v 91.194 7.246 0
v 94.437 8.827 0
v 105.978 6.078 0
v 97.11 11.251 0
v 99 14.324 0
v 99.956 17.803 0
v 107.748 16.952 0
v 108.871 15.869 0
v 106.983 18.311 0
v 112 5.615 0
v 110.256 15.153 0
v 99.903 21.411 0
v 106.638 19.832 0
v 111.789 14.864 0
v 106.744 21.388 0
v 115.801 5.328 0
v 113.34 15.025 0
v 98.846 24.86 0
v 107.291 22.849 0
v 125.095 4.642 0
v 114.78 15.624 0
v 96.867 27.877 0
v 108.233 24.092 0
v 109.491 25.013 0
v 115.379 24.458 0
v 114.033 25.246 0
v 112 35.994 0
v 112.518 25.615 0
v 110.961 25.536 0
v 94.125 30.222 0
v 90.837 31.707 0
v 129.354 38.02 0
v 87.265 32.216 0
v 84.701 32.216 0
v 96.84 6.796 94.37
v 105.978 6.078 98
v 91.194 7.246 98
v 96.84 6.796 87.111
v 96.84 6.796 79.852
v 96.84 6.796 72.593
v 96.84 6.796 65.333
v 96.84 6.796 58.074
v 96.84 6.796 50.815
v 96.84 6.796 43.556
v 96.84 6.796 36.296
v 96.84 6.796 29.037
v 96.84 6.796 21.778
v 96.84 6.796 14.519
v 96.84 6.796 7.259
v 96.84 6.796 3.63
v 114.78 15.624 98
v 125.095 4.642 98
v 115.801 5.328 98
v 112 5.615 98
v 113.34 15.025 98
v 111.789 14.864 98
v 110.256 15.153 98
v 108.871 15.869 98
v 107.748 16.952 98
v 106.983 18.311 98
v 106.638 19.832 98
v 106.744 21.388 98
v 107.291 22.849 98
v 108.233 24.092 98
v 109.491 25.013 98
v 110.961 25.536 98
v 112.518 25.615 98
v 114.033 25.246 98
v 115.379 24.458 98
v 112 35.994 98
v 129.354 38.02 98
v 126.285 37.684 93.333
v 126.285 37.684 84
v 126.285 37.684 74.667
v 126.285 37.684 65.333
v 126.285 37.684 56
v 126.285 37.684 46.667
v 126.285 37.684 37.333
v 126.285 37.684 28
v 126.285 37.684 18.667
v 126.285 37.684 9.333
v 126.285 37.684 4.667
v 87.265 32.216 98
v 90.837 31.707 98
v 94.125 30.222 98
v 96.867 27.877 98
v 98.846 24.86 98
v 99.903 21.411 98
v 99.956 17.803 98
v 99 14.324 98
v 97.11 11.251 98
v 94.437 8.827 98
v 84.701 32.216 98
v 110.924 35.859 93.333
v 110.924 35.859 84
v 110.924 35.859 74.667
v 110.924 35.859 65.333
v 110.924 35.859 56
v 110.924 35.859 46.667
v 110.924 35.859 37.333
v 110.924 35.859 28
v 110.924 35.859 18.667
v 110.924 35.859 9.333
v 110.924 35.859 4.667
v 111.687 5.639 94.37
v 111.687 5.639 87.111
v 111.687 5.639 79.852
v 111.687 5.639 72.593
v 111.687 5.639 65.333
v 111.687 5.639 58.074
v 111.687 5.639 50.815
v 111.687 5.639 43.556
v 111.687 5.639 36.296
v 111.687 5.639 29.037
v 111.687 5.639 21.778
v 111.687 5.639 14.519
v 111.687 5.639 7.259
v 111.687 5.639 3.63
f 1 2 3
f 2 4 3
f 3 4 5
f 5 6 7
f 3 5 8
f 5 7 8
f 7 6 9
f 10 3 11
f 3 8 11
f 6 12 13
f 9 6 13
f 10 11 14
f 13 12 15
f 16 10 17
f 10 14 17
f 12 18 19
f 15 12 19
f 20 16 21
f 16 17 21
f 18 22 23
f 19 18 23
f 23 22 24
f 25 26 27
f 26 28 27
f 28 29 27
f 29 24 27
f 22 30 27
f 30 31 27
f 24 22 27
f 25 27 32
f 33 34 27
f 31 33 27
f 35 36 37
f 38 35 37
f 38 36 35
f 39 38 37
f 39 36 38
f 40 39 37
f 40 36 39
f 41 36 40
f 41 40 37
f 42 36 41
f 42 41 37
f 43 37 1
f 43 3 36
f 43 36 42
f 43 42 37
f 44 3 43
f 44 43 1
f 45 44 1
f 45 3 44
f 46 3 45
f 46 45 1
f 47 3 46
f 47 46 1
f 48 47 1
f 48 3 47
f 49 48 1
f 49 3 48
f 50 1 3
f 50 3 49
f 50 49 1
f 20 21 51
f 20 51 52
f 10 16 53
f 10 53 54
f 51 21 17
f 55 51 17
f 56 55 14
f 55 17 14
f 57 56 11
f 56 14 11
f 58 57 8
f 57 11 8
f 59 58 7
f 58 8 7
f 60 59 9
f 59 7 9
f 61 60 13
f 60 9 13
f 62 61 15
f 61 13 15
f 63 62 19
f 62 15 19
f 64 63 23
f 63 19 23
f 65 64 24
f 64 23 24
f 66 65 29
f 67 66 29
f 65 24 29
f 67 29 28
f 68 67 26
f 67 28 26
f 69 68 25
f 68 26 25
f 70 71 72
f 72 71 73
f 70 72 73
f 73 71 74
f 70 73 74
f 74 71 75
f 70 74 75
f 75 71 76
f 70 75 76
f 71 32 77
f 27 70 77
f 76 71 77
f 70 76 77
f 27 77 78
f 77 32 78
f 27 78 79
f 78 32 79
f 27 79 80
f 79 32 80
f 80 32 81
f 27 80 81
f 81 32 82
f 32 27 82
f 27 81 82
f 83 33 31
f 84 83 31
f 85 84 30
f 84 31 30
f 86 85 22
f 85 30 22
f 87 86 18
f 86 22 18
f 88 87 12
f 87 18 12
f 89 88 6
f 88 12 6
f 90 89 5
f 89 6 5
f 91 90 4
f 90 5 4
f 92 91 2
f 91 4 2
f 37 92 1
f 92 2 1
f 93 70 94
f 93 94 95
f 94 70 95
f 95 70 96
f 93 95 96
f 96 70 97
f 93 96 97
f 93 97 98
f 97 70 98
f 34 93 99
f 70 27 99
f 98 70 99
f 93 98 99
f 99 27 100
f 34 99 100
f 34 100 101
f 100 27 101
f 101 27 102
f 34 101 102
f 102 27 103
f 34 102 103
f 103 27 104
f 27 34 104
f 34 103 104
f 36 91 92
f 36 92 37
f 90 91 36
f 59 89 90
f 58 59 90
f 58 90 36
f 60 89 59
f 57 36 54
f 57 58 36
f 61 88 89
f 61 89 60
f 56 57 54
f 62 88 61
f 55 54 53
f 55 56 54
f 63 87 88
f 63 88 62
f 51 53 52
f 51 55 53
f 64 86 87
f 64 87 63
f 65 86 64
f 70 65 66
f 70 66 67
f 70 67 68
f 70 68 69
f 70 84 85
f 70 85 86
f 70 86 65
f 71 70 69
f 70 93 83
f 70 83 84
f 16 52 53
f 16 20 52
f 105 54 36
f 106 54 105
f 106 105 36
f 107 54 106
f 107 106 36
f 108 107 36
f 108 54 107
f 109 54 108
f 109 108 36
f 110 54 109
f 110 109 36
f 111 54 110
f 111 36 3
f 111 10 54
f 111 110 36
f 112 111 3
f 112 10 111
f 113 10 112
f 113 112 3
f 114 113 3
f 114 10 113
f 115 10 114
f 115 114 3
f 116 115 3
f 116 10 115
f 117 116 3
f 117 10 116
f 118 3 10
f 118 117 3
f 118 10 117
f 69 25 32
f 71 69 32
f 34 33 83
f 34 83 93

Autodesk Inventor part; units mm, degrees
ref_plane "YZ Plane" through (0, 0, 0) normal (1, 0, 0) x (0, 1, 0)
ref_plane "XZ Plane" through (0, 0, 0) normal (0, 1, 0) x (-1, 0, 0)
ref_plane "XY Plane" through (0, 0, 0) normal (0, 0, 1) x (1, 0, 0)
sketch "Sketch1" plane through (0, 0, 0) normal (0, 0, 1) x (1, 0, 0)
  spline S0 degree 4 poles (254.4361, 38.2581) (252.1599, 38.6503) (246.7887, 39.4993) (237.9849, 40.6183) (225.3575, 41.7043) (211.2027, 42.3417) (196.3926, 42.4701) (181.0313, 42.0702) (165.5064, 41.2217) (149.7852, 40.0448) (134.1096, 38.5775) (118.6247, 36.8508) (103.5, 34.9393) (88.9016, 32.8834) (74.9958, 30.7382) (61.9178, 28.5627) (49.8271, 26.4098) (38.8354, 24.34) (29.0772, 22.4039) (20.6323, 20.6564) (13.6456, 19.1491) (6.9132, 17.6607) (2.9022, 16.74) (0.4691, 16.1882) (0, 16.065) knots 0.214297 0.214297 0.214297 0.214297 0.214297 0.24332 0.281775 0.321542 0.36238 0.404005 0.446178 0.488665 0.531231 0.573688 0.615803 0.657336 0.698047 0.737682 0.775986 0.812688 0.847495 0.880087 0.910093 0.937059 0.960363 1 1 1 1 1
  spline S1 degree 4 poles (300, 15.624) (299.8057, 13.313) (297.7085, 10.3432) (293.0509, 7.5008) (285.3959, 4.883) (278.1124, 3.2165) (269.5147, 1.8925) (259.681, 0.913) (248.7129, 0.2783) (236.7119, -0.0309) (223.8067, -0.0504) (210.1253, 0.1933) (195.7754, 0.645) (180.9677, 1.2494) (165.6517, 1.9825) (150.1916, 2.9048) (134.6873, 3.9451) (119.3375, 5.0495) (104.3042, 6.1987) (89.7566, 7.3561) (75.8492, 8.4887) (62.7429, 9.5824) (50.5811, 10.6226) (39.4971, 11.5797) (29.6294, 12.4513) (21.0712, 13.2264) (13.9639, 13.8721) (7.1036, 14.5126) (2.9683, 14.8997) (0.533, 15.1397) (-0.0042, 15.1841) knots 0 0 0 0 0 0.054372 0.079821 0.107912 0.138499 0.171341 0.206187 0.242784 0.280891 0.320277 0.360713 0.402023 0.443985 0.486373 0.528958 0.57146 0.613642 0.655265 0.696085 0.735853 0.774308 0.811174 0.846157 0.87893 0.909115 0.936252 0.959711 1 1 1 1 1
  arc A0 (0, 16.065) -> (-0.0042, 15.1841) centre (0.1158, 15.624) ccw
  line L0 (0.1158, 15.624) -> (227.9902, 15.624) construction
  line L1 (300, 15.624) -> (0.1158, 15.624) construction
  line L2 (300, 15.624) -> (200, 15.624) construction
  line L3 (200, 15.624) -> (200, 42.3773) construction
  line L4 (200, 15.624) -> (200, 0.5273)
  line L5 (0, 0) -> (0, 20.241)
  line L6 (0, 20.241) -> (238.581, 20.241) construction
  circle A1 centre (238.581, 20.241) radius 14
  line L7 (238.581, 20.241) -> (208.581, 20.241)
  line L8 (238.581, 25.359) -> (238.581, 20.241)
  line L9 (0, 20.241) -> (112, 20.241) construction
  line L10 (0, 15.624) -> (112, 15.624) construction
  line L11 (0, 15.624) -> (112, 15.624) construction
  line L12 (112, 15.624) -> (112, 35.9945)
  line L13 (112, 15.624) -> (112, 5.6153)
  spline S2 degree 4 poles (299.2852, 20.241) (299.2279, 20.1316) (299.168, 20.0232) (299.1056, 19.9158) (299.0406, 19.8092) knots 0.014818 0.014818 0.014818 0.014818 0.014818 0.017711 0.017711 0.017711 0.017711 0.017711
  line L14 (299.2071, 20.0822) -> (298.8742, 19.5363) construction
  arc A2 (298.904, 19.5932) -> (299.1702, 20.0296) centre (292.2911, 23.9254) ccw construction
  line L15 (299.432, 20.5214) -> (299.1384, 19.9606) construction
  arc A3 (299.1639, 20.0188) -> (299.3987, 20.4672) centre (292.801, 23.6361) ccw construction
  spline S3 degree 2 poles (295.8506, 16.56) (295.1573, 16.0692) (294.3933, 15.624) knots 0 0 0 1 1 1
  line L16 (294.5507, 15.7157) -> (294.2359, 15.5323) construction
  arc A4 (294.2672, 15.5511) -> (294.519, 15.6978) centre (283.8844, 33.657) ccw construction
  spline S4 degree 4 poles (296.8569, 15.624) (296.6183, 15.8629) (296.3707, 16.0985) (296.1147, 16.3309) (295.8506, 16.56) knots 0.044099 0.044099 0.044099 0.044099 0.044099 0.050856 0.050856 0.050856 0.050856 0.050856
  spline S5 degree 4 poles (219.5872, 34.9119) (218.6954, 34.952) (214.8585, 35.1063) (210.7072, 35.3295) (192.898, 35.4464) (181.4278, 35.0555) (165.1774, 34.1819) (149.5619, 33.1267) (133.8284, 31.3479) (128.2654, 31.0974) (123.3908, 30.59) knots 0 0 0 0 0 0.139244 0.23322 0.363937 0.509983 0.657115 0.798105 1 1 1 1 1
  line L17 (295.9593, 16.4657) -> (295.7419, 16.6543) construction
  arc A5 (295.9374, 16.4843) -> (295.7635, 16.6352) centre (281.8729, 0.4516) ccw construction
  line L18 (232.7438, 34.3645) -> (201.1936, 35.6815) construction
  arc A6 (229.5868, 34.4549) -> (204.3471, 35.5085) centre (136.3483, -1896.3245) ccw construction
  arc A7 (264.2661, 15.123) -> (264.3608, 15.624) centre (238.581, 20.241) ccw
  circle A8 centre (238.581, 20.241) radius 24
  circle A9 centre (112, 20.241) radius 15.39
  spline S6 degree 4 poles (300, 15.624) (300.2691, 17.9337) (298.7834, 21.2677) (294.6934, 24.9798) (287.5317, 28.9406) (280.4869, 31.8205) (271.481, 34.7182) (262.4868, 36.793) (257.7004, 37.6957) (254.4361, 38.2581) knots 0 0 0 0 0 0.247555 0.363857 0.49255 0.632996 0.778264 1 1 1 1 1
  line L19 (285.2945, 32.941) -> (223.5776, 43.5753) construction
  arc A10 (278.7224, 32.6349) -> (229.6682, 41.0872) centre (217.2184, -177.7386) ccw construction
  line L20 (285.2945, 32.941) -> (223.5776, 43.5753) construction
  arc A11 (278.8771, 33.0418) -> (229.6586, 41.5224) centre (200.8949, -272.4733) ccw construction
  spline S7 degree 4 poles (251.493, 31.7362) (243.7009, 32.9676) (232.1602, 34.2966) (216.4428, 35.2879) (196.3923, 35.4611) (181.0317, 35.0615) (165.5053, 34.2127) (149.7883, 33.0365) (134.1012, 31.5672) (118.6474, 29.8462) (103.4397, 27.9193) (89.0589, 25.9037) (74.8371, 23.6927) (62.4884, 21.6695) (49.6399, 19.3545) (46.3795, 18.7429) (43.8125, 18.259) knots 0 0 0 0 0 0.163963 0.232338 0.302031 0.372642 0.443778 0.515047 0.586134 0.656647 0.726187 0.794348 0.86071 0.920346 1 1 1 1 1 construction
  spline S8 degree 4 poles (295.845, 16.556) (295.7198, 16.6646) (294.585, 17.6283) (292.0585, 19.4283) (287.5167, 21.9347) (280.467, 24.8321) (271.9714, 27.5226) (264.2087, 29.4004) (258.4092, 30.5515) (255.0536, 31.1429) (254.4361, 31.2493) (253.9689, 31.3298) (253.5018, 31.4103) (253.0347, 31.4908) (252.5676, 31.5712) knots 0.050892 0.050892 0.050892 0.050892 0.050892 0.054094 0.079507 0.107628 0.138317 0.171335 0.206423 0.214297 0.214297 0.214297 0.214297 0.220253 0.220253 0.220253 0.220253 0.220253
  line L21 (285.2945, 25.9322) -> (223.5776, 36.5664) construction
  line L22 (285.2945, 25.9322) -> (223.5776, 36.5664) construction
  arc A12 (278.7224, 25.626) -> (229.6682, 34.0784) centre (217.2184, -184.7474) ccw construction
  line L23 (270.129, 9.1254) -> (275.129, 9.1254) construction
  line L24 (281.07, 24.4582) -> (286.07, 24.4582) construction
  line L25 (318.8214, -3.3673) -> (272.8686, 36.4793) construction
  arc A13 (303.2079, 0.552) -> (278.9595, 21.5782) centre (281.8576, 0.4252) ccw construction
  spline S9 degree 4 poles (295.8353, 16.5644) (293.4171, 14.8846) (288.4135, 12.6926) (280.7063, 10.6698) (269.511, 8.9398) (259.6826, 7.9632) (248.7122, 7.3273) (236.7121, 7.0186) (223.8065, 6.9989) (210.1254, 7.2427) (195.7753, 7.6944) (180.968, 8.2987) (165.6509, 9.032) (150.1939, 9.954) (134.681, 10.995) (119.3545, 12.0974) (104.259, 13.2519) (89.8748, 14.3954) (75.7524, 15.5471) (62.9065, 16.6165) (50.5107, 17.6776) (46.5166, 18.0246) (43.8125, 18.259) knots 0 0 0 0 0 0.084767 0.124025 0.166179 0.210904 0.257877 0.306788 0.35734 0.409241 0.462263 0.516122 0.570528 0.625186 0.679738 0.73388 0.787304 0.839697 0.89074 0.937143 1 1 1 1 1
  spline S10 degree 4 poles (21.4623, 20.241) (20.6227, 20.317) (20.124, 20.3622) (19.9191, 20.3809) (19.554, 20.414) knots 0.979732 0.979732 0.979732 0.979732 0.979732 1 1 1 1 1 construction
  line L26 (68.4884, 16.1198) -> (19.1367, 20.3983) construction
  arc A14 (63.5515, 16.5281) -> (24.0702, 19.9509) centre (-819.8994, -9944.3712) ccw construction
  line L27 (21.7244, 20.2173) -> (21.2001, 20.2647) construction
  arc A15 (21.2525, 20.26) -> (21.672, 20.222) centre (898.6358, 9712.9556) ccw construction
  line L28 (74.2541, 23.9969) -> (13.371, 12.5211) construction
  arc A16 (68.1759, 22.7939) -> (19.47, 13.6134) centre (1053.3901, -5337.891) ccw construction
  spline S11 degree 4 poles (218.4375, 7.1934) (217.6173, 7.2408) (213.8192, 7.4688) (209.5863, 6.8507) (192.5485, 7.9441) (181.1469, 8.163) (165.7461, 9.0283) (149.1424, 9.8801) (139.9777, 10.7519) (129.1073, 11.2464) (124.6867, 11.5289) knots 0 0 0 0 0 0.127631 0.213723 0.333628 0.467446 0.602621 0.738424 0.880395 0.880395 0.880395 0.880395 0.880395 construction
  line L29 (133.5337, 10.9635) -> (115.8396, 12.0942) construction
  arc A17 (117.618, 12.0789) -> (131.7678, 11.1747) centre (141.027, 267.2384) ccw construction
  line L30 (140.665, 32.3881) -> (106.1166, 28.792) construction
  arc A18 (137.222, 31.4497) -> (109.679, 28.5828) centre (140.6225, -134.9596) ccw construction
  circle A19 centre (238.581, 20.241) radius 18
  line L31 (238.581, 38.241) -> (225.78, 41.559)
  line L32 (238.581, 2.241) -> (224.22, 0)
  line L33 (214.581, 20.241) -> (214.581, 42.1266) construction
  line L34 (127.39, 20.241) -> (127.39, 11.5255) construction
  line L35 (127.39, 20.241) -> (131.3139, 20.241) construction
  line L36 (96.61, 20.241) -> (96.61, 13.8631) construction
  line L37 (270.129, 5.6153) -> (270.129, 15.624) construction
  line L38 (272.129, 7.6153) -> (272.129, 13.624)
  line L39 (268.129, 13.624) -> (268.129, 7.6153)
  arc A20 (268.129, 7.6153) -> (272.129, 7.6153) centre (270.129, 7.6153) ccw
  arc A21 (272.129, 13.624) -> (268.129, 13.624) centre (270.129, 13.624) ccw
  line L40 (270.129, 32.1807) -> (270.129, 22.172) construction
  line L41 (272.129, 30.1807) -> (272.129, 24.172)
  line L42 (268.129, 24.172) -> (268.129, 30.1807)
  arc A22 (272.129, 30.1807) -> (268.129, 30.1807) centre (270.129, 30.1807) ccw
  arc A23 (268.129, 24.172) -> (272.129, 24.172) centre (270.129, 24.172) ccw
  arc A24 (200, 42.3155) -> (199.8539, 42.3773) centre (190.581, 20.241) ccw
  arc A25 (171.273, 34.4958) -> (171.2681, 34.4892) centre (190.581, 20.241) ccw
  arc A26 (210.7484, 7.2304) -> (209.2875, 35.2765) centre (190.581, 20.241) ccw
  arc A27 (169.4455, 8.8703) -> (169.4744, 8.8168) centre (190.581, 20.241) ccw
  arc A28 (153.9768, 9.6824) -> (154.0303, 9.7394) centre (142.78, 20.241) ccw
  arc A29 (151.2419, 33.0959) -> (151.2193, 33.1107) centre (142.78, 20.241) ccw
  arc A30 (132.1299, 31.3508) -> (130.3229, 11.2037) centre (142.78, 20.241) ccw
  arc A31 (66.334, 16.3348) -> (66.5389, 15.624) centre (81.22, 20.241) ccw
  line L43 (112, 20.241) -> (112, 14.851) construction
  line L44 (112, 14.851) -> (91.265, 14.851) construction
  line L45 (112, 20.241) -> (87.265, 20.241) construction
  line L46 (87.265, 20.241) -> (87.265, 19.422) construction
  circle A32 centre (87.265, 19.422) radius 12.794
  line L47 (87.265, 32.216) -> (84.7014, 32.216)
  circle A33 centre (112.0123, 20.2492) radius 5.39
  line L48 (122.5954, 17.6185) -> (122.5954, 13.8685)
  line L49 (122.5954, 21.3685) -> (122.5954, 13.8685)
  line L50 (127.5954, 13.8685) -> (127.5954, 21.3685)
  line L51 (122.5954, 13.8685) -> (127.5954, 13.8685)
  line L52 (127.5954, 21.3685) -> (122.5954, 21.3685)
  line L53 (112.0123, 20.2492) -> (146.6953, 20.2492) construction
  line L54 (167.5954, 17.6185) -> (170.0954, 17.6185) construction
  line L55 (167.5954, 17.6185) -> (167.5954, 21.3685)
  line L56 (167.5954, 13.8685) -> (167.5954, 21.3685)
  line L57 (162.5954, 13.8685) -> (167.5954, 13.8685)
  line L58 (162.5954, 21.3685) -> (162.5954, 13.8685)
  line L59 (167.5954, 21.3685) -> (162.5954, 21.3685)
  line L60 (146.5954, 17.6185) -> (170.5954, 17.6185) construction
  line L61 (146.5954, 17.6185) -> (167.5954, 17.6185) construction
  arc A34 (179.5651, 35.2547) -> (178.1042, 7.2085) centre (198.2716, 20.2192) ccw
  line L62 (115.3793, 24.4582) -> (129.3538, 38.0195)
  line L63 (115.3793, 16.0238) -> (129.3538, 2.4625)
  line L64 (114.78, 15.624) -> (125.0954, 4.6416)
  point P0 (0.783, 16.254)
  point P1 (3.213, 16.812)
  point P2 (7.239, 17.724)
  point P3 (12.813, 18.96)
  point P4 (19.884, 20.484)
  point P5 (28.374, 22.245)
  point P6 (38.199, 24.195)
  point P7 (49.254, 26.28)
  point P8 (61.419, 28.446)
  point P9 (74.571, 30.636)
  point P10 (88.56, 32.793)
  point P11 (103.242, 34.86)
  point P12 (118.455, 36.783)
  point P13 (134.028, 38.511)
  point P14 (149.793, 39.984)
  point P15 (165.576, 41.16)
  point P16 (181.206, 41.985)
  point P17 (196.638, 42.363)
  point P18 (211.554, 42.222)
  point P19 (239.145, 40.389)
  point P20 (262.68, 36.666)
  point P21 (272.577, 34.218)
  point P22 (281.07, 31.467)
  point P23 (288.069, 28.491)
  point P24 (293.505, 25.359)
  point P25 (297.324, 22.137)
  point P26 (300, 15.624)
  point P27 (0.861, 15.105)
  point P28 (3.342, 14.868)
  point P29 (7.446, 14.481)
  point P30 (13.122, 13.953)
  point P31 (20.31, 13.296)
  point P32 (28.92, 12.519)
  point P33 (38.856, 11.64)
  point P34 (50.007, 10.674)
  point P35 (62.244, 9.63)
  point P36 (75.429, 8.529)
  point P37 (89.418, 7.389)
  point P38 (104.052, 6.228)
  point P39 (119.172, 5.076)
  point P40 (134.613, 3.966)
  point P41 (150.207, 2.928)
  point P42 (165.783, 2.013)
  point P43 (181.167, 1.263)
  point P44 (196.068, 0.663)
  point P45 (210.468, 0.225)
  point P46 (237.189, 0.039)
  point P47 (249.246, 0.378)
  point P48 (260.262, 1.05)
  point P49 (270.129, 2.076)
  point P50 (278.739, 3.462)
  point P51 (285.993, 5.211)
  point P52 (291.81, 7.314)
  point P53 (296.121, 9.756)
  point P54 (298.863, 12.531)
  point P55 (200, 15.624)
  point P56 (225.3642, 15.624)
  point P57 (238.581, 6.241)
  point P58 (238.581, 34.241)
  point P59 (225.3642, 15.624)
  point P60 (251.7978, 15.624)
  point P61 (0, 16.065)
  point P62 (0, 15.1838)
  point P63 (224.581, 20.241)
  point P64 (0, 9.065)
  point P65 (0.783, 9.254)
  point P66 (3.213, 9.812)
  point P67 (7.239, 10.724)
  point P68 (12.813, 11.96)
  point P69 (19.884, 13.484)
  point P70 (28.374, 15.245)
  point P71 (38.199, 17.195)
  point P72 (49.254, 19.28)
  point P73 (61.419, 21.446)
  point P74 (74.571, 23.636)
  point P75 (88.56, 25.793)
  point P76 (103.242, 27.86)
  point P77 (118.455, 29.783)
  point P78 (134.028, 31.511)
  point P79 (149.793, 32.984)
  point P80 (165.576, 34.16)
  point P81 (181.206, 34.985)
  point P82 (225.78, 34.559)
  point P83 (239.145, 33.389)
  point P84 (251.493, 31.745)
  point P85 (262.68, 29.666)
  point P86 (272.577, 27.218)
  point P87 (281.07, 24.467)
  point P88 (288.069, 21.491)
  point P89 (293.505, 18.359)
  point P90 (297.324, 15.137)
  point P91 (299.493, 11.879)
  point P92 (300, 8.624)
  point P93 (-0.0042, 22.1841)
  point P94 (0.861, 22.105)
  point P95 (3.342, 21.868)
  point P96 (7.446, 21.481)
  point P97 (13.122, 20.953)
  point P98 (20.31, 20.296)
  point P99 (28.92, 19.519)
  point P100 (38.856, 18.64)
  point P101 (50.007, 17.674)
  point P102 (62.244, 16.63)
  point P103 (75.429, 15.529)
  point P104 (89.418, 14.389)
  point P105 (104.052, 13.228)
  point P106 (119.172, 12.076)
  point P107 (134.613, 10.966)
  point P108 (150.207, 9.928)
  point P109 (165.783, 9.013)
  point P110 (181.167, 8.263)
  point P111 (196.068, 7.663)
  point P112 (210.468, 7.225)
  point P113 (224.22, 7)
  point P114 (237.189, 7.039)
  point P115 (249.246, 7.378)
  point P116 (260.262, 8.05)
  point P117 (270.129, 9.076)
  point P118 (278.739, 10.462)
  point P119 (285.993, 12.211)
  point P120 (291.81, 14.314)
  point P121 (296.121, 16.756)
  point P122 (298.863, 19.531)
  point P123 (300, 22.624)
  point P124 (18.7405, 20.241)
  point P125 (216.9687, 35.023)
  point P126 (0, 16.065)
  point P127 (296.8569, 15.624)
  point P128 (294.3933, 15.624)
  point P129 (219.5872, 34.9119)
  point P130 (123.3908, 30.59)
  point P131 (254.4361, 38.2581)
  point P132 (0, 9.0562)
  point P133 (0.783, 9.2452)
  point P134 (3.213, 9.8032)
  point P135 (7.239, 10.7152)
  point P136 (12.813, 11.9512)
  point P137 (19.884, 13.4752)
  point P138 (28.374, 15.2362)
  point P139 (38.199, 17.1862)
  point P140 (49.254, 19.2712)
  point P141 (61.419, 21.4372)
  point P142 (74.571, 23.6272)
  point P143 (88.56, 25.7842)
  point P144 (103.242, 27.8512)
  point P145 (118.455, 29.7742)
  point P146 (134.028, 31.5022)
  point P147 (149.793, 32.9752)
  point P148 (165.576, 34.1512)
  point P149 (181.206, 34.9762)
  point P150 (196.638, 35.3542)
  point P151 (211.554, 35.2132)
  point P152 (225.78, 34.5502)
  point P153 (262.68, 29.6572)
  point P154 (272.577, 27.2092)
  point P155 (297.324, 15.1282)
  point P156 (299.493, 11.8702)
  point P157 (300, 8.6152)
  point P158 (254.4361, 31.2493)
  point P159 (216.8848, -206.3625)
  point P160 (278.8769, 26.0734)
  point P161 (229.5906, 33.8662)
  point P162 (-0.0042, 22.2335)
  point P163 (0.861, 22.1544)
  point P164 (3.342, 21.9174)
  point P165 (7.446, 21.5304)
  point P166 (13.122, 21.0024)
  point P167 (28.92, 19.5684)
  point P168 (38.856, 18.6894)
  point P169 (50.007, 17.7234)
  point P170 (62.244, 16.6794)
  point P171 (75.429, 15.5784)
  point P172 (89.418, 14.4384)
  point P173 (104.052, 13.2774)
  point P174 (119.172, 12.1254)
  point P175 (134.613, 11.0154)
  point P176 (150.207, 9.9774)
  point P177 (165.783, 9.0624)
  point P178 (181.167, 8.3124)
  point P179 (196.068, 7.7124)
  point P180 (210.468, 7.2744)
  point P181 (224.22, 7.0494)
  point P182 (237.189, 7.0884)
  point P183 (249.246, 7.4274)
  point P184 (260.262, 8.0994)
  point P185 (278.739, 10.5114)
  point P186 (285.993, 12.2604)
  point P187 (296.121, 16.8054)
  point P188 (298.863, 19.5804)
  point P189 (300, 22.6734)
  point P190 (225.7, -0.0094)
  point P191 (252.2617, 0.522)
  point P192 (227.3495, 41.4508)
  point P193 (105.9778, 6.0782)
  point P194 (115.8008, 5.3277)
  point P195 (98.26, 27.1738)
  point P196 (260.4522, 30.1228)
  point P197 (123.5853, 30.3718)
  point P198 (134.5979, 31.5604)
  point P199 (134.4982, 31.5502)
  dimension "d63" = 25.588
  dimension "d17" = 100
  dimension "d19" = 20.241
  dimension "d20" = 238.581
  dimension "d21" = 28
  dimension "d37" = 112
  dimension "d39" = 112
  dimension "d40" = 0
  dimension "d43" = 10
  dimension "d55" = 4
  dimension "d56" = 90
  dimension "d58" = 4
  dimension "d59" = 20.735
  dimension "d61" = 24.735
  dimension "d62" = 0.819
  dimension "d64" = 34.683
extrude "Extrusion3" add sketch "Sketch1" along normal blind 98 contours L62 A9 L12 S0 | L12 A9 A32 L47 S0 | L62 A33 L12 A9 | L12 A33 L13 S9 A32 A9 | A33 L64 S9 L13 | S9 L64 A9 S1 L13 | L13 S1 A9 A32 S9 | A9 S1 A32 | L64 S1 A9
properties part number "R10-11 Foam"
